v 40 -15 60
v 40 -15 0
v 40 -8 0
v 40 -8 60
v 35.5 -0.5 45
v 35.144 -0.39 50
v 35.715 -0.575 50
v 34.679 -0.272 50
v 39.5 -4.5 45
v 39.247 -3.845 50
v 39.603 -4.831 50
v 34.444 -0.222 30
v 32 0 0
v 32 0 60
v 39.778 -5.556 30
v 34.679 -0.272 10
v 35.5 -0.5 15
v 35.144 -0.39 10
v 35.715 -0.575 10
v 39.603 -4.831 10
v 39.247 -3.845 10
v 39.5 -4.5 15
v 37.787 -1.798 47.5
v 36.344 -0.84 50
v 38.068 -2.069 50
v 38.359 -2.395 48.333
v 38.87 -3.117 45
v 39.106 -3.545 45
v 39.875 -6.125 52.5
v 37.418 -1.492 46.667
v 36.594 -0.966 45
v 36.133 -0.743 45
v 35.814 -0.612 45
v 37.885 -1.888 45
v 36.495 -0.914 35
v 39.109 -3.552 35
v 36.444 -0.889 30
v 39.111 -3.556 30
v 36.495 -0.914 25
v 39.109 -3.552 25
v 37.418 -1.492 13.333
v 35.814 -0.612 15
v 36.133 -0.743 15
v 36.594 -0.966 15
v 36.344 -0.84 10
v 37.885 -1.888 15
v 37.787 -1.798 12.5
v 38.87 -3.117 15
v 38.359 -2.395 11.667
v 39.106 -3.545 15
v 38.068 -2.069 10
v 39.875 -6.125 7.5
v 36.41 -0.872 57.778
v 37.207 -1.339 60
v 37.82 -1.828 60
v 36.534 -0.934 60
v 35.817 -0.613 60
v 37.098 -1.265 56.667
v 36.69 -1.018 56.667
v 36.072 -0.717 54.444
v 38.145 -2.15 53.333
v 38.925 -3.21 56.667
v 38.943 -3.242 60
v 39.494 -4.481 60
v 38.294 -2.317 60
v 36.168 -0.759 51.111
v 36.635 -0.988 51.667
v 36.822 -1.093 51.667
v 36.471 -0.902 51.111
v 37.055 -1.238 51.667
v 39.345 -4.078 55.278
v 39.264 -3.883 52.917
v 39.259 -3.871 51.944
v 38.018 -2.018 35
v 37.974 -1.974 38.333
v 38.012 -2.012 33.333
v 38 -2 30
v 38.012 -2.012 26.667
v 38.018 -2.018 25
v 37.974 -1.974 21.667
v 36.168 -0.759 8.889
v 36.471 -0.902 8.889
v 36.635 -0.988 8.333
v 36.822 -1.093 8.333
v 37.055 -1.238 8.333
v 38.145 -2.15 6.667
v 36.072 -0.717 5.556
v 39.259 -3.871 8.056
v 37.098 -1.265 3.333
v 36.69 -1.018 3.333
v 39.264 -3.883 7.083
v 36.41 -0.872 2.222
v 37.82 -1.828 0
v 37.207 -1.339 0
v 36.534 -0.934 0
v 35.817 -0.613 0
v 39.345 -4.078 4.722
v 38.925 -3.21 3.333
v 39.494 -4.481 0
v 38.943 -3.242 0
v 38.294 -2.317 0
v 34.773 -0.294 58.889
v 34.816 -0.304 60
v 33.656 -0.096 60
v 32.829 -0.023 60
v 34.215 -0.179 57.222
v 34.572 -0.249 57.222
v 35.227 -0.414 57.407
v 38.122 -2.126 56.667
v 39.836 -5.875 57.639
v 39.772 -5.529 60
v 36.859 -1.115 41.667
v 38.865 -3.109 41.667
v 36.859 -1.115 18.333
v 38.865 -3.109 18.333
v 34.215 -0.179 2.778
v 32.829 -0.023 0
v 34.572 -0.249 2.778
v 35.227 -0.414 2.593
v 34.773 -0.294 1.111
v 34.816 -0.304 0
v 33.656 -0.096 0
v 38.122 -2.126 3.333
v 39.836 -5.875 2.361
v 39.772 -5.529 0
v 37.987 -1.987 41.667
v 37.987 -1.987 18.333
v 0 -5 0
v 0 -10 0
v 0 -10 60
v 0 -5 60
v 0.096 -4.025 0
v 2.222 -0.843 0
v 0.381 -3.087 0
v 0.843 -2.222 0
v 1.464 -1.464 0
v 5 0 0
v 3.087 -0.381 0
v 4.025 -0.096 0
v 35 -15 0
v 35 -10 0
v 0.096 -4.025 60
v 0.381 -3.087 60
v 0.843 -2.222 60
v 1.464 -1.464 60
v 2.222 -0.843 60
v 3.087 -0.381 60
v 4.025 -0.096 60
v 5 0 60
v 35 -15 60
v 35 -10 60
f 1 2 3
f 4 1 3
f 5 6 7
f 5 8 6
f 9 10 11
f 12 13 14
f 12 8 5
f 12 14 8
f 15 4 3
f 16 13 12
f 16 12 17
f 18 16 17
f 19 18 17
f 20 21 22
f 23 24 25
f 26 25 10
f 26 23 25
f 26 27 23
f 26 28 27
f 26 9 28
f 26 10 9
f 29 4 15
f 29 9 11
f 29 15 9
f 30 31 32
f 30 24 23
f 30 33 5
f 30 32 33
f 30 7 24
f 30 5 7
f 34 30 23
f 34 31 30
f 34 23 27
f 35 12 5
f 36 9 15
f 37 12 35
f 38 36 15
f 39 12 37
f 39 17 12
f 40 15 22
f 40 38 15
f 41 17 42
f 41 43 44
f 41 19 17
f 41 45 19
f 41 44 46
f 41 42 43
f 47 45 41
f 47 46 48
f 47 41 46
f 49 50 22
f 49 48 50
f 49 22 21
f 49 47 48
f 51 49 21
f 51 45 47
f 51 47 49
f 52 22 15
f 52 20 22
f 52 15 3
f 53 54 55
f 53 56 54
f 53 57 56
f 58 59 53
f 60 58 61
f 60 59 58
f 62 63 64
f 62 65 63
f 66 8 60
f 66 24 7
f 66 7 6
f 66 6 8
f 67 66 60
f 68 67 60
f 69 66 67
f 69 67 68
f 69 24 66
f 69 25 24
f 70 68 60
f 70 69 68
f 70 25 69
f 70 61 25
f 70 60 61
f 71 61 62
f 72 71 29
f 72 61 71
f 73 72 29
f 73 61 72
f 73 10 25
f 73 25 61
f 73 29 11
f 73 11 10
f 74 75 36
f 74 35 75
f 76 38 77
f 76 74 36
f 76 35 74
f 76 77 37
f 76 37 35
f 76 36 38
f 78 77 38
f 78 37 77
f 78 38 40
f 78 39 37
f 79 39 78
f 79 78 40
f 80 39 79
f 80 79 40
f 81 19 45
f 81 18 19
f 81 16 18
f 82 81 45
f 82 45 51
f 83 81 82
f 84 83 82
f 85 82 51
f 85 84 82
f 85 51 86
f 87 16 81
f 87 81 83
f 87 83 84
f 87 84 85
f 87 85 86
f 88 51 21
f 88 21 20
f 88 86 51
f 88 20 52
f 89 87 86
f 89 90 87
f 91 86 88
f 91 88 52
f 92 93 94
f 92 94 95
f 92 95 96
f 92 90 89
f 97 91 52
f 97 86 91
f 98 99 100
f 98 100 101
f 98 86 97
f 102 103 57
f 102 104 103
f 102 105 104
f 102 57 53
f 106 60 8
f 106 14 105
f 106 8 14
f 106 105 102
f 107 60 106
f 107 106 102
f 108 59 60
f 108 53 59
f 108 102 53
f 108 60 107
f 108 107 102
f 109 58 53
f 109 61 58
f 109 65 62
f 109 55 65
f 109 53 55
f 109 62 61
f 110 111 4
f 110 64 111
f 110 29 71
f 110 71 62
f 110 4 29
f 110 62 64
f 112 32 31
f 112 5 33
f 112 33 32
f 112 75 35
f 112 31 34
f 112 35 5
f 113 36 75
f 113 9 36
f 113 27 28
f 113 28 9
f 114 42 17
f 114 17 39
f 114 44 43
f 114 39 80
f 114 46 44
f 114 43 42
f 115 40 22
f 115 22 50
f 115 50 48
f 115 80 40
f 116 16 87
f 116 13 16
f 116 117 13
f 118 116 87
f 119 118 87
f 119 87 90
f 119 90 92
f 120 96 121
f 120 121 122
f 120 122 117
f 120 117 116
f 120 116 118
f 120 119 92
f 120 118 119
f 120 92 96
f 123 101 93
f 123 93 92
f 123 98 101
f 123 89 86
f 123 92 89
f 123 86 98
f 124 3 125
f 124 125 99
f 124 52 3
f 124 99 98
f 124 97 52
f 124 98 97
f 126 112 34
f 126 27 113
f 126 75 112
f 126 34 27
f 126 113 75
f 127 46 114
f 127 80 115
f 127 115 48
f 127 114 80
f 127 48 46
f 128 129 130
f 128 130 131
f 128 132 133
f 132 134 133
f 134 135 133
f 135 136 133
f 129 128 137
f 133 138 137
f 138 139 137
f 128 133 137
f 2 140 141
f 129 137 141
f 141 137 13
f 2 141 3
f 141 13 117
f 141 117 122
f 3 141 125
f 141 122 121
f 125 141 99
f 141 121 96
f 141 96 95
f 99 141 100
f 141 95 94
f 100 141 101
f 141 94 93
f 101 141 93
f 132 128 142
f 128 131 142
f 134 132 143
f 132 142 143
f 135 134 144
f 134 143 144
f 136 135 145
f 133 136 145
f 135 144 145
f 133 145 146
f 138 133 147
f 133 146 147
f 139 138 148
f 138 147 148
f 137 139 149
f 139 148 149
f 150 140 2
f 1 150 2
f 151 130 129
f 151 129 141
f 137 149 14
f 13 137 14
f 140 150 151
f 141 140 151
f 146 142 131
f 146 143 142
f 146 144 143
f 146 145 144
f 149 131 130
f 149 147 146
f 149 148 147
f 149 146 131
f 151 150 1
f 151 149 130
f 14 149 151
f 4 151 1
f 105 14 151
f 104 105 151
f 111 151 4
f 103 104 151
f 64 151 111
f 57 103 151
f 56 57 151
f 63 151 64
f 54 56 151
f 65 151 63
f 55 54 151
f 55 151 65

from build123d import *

# Parameters (mm, degrees)
F0_W        = 40
F0_H        = 15
F1_DEPTH    = 60
F2_W        = 35
F2_H        = 5
F3_DEPTH    = 60
F4_T1_DEPTH = 100
F5_R        = 5


# Not quite as in the source:
# - a fillet or chamfer that OpenCascade refuses, or shapes differently, is made with other operations: its cross-section is extruded or revolved along the edge and cut away or added


with BuildPart() as f1:
    # F0 (on Top) → F1 (new body)
    with BuildSketch(Plane.XY):
        with Locations((20, -7.5)):
            Rectangle(F0_W, F0_H)
    extrude(amount=F1_DEPTH)

    # F2 (on face) → F3 (cut, through all)
    with BuildSketch(Plane.XY.offset(60)):
        with Locations((17.5, -12.5)):
            Rectangle(F2_W, F2_H)
    extrude(amount=-F3_DEPTH, mode=Mode.SUBTRACT)

    # F4: fillet of radius 8 on 1 edges, made by hand

    # F4_s2 → F4_t1 (cut)
    with BuildSketch(Plane.XY.offset(-20)):
        with BuildLine():
            add(Edge.make_bspline(
                [(32, 0), (40, 0), (40, -8)],
                knots=[0, 0, 0, 1, 1, 1], degree=2, weights=[1, 1, 1]))
            Line((40, -8), (40, 0))
            Line((40, 0), (32, 0))
        make_face()
    extrude(amount=F4_T1_DEPTH, mode=Mode.SUBTRACT)

    # F5
    f5_edges = [f1.edges().sort_by_distance(p)[0] for p in [
        (0, 0, 30),
    ]]
    fillet(f5_edges, radius=F5_R)


solid = f1.part
